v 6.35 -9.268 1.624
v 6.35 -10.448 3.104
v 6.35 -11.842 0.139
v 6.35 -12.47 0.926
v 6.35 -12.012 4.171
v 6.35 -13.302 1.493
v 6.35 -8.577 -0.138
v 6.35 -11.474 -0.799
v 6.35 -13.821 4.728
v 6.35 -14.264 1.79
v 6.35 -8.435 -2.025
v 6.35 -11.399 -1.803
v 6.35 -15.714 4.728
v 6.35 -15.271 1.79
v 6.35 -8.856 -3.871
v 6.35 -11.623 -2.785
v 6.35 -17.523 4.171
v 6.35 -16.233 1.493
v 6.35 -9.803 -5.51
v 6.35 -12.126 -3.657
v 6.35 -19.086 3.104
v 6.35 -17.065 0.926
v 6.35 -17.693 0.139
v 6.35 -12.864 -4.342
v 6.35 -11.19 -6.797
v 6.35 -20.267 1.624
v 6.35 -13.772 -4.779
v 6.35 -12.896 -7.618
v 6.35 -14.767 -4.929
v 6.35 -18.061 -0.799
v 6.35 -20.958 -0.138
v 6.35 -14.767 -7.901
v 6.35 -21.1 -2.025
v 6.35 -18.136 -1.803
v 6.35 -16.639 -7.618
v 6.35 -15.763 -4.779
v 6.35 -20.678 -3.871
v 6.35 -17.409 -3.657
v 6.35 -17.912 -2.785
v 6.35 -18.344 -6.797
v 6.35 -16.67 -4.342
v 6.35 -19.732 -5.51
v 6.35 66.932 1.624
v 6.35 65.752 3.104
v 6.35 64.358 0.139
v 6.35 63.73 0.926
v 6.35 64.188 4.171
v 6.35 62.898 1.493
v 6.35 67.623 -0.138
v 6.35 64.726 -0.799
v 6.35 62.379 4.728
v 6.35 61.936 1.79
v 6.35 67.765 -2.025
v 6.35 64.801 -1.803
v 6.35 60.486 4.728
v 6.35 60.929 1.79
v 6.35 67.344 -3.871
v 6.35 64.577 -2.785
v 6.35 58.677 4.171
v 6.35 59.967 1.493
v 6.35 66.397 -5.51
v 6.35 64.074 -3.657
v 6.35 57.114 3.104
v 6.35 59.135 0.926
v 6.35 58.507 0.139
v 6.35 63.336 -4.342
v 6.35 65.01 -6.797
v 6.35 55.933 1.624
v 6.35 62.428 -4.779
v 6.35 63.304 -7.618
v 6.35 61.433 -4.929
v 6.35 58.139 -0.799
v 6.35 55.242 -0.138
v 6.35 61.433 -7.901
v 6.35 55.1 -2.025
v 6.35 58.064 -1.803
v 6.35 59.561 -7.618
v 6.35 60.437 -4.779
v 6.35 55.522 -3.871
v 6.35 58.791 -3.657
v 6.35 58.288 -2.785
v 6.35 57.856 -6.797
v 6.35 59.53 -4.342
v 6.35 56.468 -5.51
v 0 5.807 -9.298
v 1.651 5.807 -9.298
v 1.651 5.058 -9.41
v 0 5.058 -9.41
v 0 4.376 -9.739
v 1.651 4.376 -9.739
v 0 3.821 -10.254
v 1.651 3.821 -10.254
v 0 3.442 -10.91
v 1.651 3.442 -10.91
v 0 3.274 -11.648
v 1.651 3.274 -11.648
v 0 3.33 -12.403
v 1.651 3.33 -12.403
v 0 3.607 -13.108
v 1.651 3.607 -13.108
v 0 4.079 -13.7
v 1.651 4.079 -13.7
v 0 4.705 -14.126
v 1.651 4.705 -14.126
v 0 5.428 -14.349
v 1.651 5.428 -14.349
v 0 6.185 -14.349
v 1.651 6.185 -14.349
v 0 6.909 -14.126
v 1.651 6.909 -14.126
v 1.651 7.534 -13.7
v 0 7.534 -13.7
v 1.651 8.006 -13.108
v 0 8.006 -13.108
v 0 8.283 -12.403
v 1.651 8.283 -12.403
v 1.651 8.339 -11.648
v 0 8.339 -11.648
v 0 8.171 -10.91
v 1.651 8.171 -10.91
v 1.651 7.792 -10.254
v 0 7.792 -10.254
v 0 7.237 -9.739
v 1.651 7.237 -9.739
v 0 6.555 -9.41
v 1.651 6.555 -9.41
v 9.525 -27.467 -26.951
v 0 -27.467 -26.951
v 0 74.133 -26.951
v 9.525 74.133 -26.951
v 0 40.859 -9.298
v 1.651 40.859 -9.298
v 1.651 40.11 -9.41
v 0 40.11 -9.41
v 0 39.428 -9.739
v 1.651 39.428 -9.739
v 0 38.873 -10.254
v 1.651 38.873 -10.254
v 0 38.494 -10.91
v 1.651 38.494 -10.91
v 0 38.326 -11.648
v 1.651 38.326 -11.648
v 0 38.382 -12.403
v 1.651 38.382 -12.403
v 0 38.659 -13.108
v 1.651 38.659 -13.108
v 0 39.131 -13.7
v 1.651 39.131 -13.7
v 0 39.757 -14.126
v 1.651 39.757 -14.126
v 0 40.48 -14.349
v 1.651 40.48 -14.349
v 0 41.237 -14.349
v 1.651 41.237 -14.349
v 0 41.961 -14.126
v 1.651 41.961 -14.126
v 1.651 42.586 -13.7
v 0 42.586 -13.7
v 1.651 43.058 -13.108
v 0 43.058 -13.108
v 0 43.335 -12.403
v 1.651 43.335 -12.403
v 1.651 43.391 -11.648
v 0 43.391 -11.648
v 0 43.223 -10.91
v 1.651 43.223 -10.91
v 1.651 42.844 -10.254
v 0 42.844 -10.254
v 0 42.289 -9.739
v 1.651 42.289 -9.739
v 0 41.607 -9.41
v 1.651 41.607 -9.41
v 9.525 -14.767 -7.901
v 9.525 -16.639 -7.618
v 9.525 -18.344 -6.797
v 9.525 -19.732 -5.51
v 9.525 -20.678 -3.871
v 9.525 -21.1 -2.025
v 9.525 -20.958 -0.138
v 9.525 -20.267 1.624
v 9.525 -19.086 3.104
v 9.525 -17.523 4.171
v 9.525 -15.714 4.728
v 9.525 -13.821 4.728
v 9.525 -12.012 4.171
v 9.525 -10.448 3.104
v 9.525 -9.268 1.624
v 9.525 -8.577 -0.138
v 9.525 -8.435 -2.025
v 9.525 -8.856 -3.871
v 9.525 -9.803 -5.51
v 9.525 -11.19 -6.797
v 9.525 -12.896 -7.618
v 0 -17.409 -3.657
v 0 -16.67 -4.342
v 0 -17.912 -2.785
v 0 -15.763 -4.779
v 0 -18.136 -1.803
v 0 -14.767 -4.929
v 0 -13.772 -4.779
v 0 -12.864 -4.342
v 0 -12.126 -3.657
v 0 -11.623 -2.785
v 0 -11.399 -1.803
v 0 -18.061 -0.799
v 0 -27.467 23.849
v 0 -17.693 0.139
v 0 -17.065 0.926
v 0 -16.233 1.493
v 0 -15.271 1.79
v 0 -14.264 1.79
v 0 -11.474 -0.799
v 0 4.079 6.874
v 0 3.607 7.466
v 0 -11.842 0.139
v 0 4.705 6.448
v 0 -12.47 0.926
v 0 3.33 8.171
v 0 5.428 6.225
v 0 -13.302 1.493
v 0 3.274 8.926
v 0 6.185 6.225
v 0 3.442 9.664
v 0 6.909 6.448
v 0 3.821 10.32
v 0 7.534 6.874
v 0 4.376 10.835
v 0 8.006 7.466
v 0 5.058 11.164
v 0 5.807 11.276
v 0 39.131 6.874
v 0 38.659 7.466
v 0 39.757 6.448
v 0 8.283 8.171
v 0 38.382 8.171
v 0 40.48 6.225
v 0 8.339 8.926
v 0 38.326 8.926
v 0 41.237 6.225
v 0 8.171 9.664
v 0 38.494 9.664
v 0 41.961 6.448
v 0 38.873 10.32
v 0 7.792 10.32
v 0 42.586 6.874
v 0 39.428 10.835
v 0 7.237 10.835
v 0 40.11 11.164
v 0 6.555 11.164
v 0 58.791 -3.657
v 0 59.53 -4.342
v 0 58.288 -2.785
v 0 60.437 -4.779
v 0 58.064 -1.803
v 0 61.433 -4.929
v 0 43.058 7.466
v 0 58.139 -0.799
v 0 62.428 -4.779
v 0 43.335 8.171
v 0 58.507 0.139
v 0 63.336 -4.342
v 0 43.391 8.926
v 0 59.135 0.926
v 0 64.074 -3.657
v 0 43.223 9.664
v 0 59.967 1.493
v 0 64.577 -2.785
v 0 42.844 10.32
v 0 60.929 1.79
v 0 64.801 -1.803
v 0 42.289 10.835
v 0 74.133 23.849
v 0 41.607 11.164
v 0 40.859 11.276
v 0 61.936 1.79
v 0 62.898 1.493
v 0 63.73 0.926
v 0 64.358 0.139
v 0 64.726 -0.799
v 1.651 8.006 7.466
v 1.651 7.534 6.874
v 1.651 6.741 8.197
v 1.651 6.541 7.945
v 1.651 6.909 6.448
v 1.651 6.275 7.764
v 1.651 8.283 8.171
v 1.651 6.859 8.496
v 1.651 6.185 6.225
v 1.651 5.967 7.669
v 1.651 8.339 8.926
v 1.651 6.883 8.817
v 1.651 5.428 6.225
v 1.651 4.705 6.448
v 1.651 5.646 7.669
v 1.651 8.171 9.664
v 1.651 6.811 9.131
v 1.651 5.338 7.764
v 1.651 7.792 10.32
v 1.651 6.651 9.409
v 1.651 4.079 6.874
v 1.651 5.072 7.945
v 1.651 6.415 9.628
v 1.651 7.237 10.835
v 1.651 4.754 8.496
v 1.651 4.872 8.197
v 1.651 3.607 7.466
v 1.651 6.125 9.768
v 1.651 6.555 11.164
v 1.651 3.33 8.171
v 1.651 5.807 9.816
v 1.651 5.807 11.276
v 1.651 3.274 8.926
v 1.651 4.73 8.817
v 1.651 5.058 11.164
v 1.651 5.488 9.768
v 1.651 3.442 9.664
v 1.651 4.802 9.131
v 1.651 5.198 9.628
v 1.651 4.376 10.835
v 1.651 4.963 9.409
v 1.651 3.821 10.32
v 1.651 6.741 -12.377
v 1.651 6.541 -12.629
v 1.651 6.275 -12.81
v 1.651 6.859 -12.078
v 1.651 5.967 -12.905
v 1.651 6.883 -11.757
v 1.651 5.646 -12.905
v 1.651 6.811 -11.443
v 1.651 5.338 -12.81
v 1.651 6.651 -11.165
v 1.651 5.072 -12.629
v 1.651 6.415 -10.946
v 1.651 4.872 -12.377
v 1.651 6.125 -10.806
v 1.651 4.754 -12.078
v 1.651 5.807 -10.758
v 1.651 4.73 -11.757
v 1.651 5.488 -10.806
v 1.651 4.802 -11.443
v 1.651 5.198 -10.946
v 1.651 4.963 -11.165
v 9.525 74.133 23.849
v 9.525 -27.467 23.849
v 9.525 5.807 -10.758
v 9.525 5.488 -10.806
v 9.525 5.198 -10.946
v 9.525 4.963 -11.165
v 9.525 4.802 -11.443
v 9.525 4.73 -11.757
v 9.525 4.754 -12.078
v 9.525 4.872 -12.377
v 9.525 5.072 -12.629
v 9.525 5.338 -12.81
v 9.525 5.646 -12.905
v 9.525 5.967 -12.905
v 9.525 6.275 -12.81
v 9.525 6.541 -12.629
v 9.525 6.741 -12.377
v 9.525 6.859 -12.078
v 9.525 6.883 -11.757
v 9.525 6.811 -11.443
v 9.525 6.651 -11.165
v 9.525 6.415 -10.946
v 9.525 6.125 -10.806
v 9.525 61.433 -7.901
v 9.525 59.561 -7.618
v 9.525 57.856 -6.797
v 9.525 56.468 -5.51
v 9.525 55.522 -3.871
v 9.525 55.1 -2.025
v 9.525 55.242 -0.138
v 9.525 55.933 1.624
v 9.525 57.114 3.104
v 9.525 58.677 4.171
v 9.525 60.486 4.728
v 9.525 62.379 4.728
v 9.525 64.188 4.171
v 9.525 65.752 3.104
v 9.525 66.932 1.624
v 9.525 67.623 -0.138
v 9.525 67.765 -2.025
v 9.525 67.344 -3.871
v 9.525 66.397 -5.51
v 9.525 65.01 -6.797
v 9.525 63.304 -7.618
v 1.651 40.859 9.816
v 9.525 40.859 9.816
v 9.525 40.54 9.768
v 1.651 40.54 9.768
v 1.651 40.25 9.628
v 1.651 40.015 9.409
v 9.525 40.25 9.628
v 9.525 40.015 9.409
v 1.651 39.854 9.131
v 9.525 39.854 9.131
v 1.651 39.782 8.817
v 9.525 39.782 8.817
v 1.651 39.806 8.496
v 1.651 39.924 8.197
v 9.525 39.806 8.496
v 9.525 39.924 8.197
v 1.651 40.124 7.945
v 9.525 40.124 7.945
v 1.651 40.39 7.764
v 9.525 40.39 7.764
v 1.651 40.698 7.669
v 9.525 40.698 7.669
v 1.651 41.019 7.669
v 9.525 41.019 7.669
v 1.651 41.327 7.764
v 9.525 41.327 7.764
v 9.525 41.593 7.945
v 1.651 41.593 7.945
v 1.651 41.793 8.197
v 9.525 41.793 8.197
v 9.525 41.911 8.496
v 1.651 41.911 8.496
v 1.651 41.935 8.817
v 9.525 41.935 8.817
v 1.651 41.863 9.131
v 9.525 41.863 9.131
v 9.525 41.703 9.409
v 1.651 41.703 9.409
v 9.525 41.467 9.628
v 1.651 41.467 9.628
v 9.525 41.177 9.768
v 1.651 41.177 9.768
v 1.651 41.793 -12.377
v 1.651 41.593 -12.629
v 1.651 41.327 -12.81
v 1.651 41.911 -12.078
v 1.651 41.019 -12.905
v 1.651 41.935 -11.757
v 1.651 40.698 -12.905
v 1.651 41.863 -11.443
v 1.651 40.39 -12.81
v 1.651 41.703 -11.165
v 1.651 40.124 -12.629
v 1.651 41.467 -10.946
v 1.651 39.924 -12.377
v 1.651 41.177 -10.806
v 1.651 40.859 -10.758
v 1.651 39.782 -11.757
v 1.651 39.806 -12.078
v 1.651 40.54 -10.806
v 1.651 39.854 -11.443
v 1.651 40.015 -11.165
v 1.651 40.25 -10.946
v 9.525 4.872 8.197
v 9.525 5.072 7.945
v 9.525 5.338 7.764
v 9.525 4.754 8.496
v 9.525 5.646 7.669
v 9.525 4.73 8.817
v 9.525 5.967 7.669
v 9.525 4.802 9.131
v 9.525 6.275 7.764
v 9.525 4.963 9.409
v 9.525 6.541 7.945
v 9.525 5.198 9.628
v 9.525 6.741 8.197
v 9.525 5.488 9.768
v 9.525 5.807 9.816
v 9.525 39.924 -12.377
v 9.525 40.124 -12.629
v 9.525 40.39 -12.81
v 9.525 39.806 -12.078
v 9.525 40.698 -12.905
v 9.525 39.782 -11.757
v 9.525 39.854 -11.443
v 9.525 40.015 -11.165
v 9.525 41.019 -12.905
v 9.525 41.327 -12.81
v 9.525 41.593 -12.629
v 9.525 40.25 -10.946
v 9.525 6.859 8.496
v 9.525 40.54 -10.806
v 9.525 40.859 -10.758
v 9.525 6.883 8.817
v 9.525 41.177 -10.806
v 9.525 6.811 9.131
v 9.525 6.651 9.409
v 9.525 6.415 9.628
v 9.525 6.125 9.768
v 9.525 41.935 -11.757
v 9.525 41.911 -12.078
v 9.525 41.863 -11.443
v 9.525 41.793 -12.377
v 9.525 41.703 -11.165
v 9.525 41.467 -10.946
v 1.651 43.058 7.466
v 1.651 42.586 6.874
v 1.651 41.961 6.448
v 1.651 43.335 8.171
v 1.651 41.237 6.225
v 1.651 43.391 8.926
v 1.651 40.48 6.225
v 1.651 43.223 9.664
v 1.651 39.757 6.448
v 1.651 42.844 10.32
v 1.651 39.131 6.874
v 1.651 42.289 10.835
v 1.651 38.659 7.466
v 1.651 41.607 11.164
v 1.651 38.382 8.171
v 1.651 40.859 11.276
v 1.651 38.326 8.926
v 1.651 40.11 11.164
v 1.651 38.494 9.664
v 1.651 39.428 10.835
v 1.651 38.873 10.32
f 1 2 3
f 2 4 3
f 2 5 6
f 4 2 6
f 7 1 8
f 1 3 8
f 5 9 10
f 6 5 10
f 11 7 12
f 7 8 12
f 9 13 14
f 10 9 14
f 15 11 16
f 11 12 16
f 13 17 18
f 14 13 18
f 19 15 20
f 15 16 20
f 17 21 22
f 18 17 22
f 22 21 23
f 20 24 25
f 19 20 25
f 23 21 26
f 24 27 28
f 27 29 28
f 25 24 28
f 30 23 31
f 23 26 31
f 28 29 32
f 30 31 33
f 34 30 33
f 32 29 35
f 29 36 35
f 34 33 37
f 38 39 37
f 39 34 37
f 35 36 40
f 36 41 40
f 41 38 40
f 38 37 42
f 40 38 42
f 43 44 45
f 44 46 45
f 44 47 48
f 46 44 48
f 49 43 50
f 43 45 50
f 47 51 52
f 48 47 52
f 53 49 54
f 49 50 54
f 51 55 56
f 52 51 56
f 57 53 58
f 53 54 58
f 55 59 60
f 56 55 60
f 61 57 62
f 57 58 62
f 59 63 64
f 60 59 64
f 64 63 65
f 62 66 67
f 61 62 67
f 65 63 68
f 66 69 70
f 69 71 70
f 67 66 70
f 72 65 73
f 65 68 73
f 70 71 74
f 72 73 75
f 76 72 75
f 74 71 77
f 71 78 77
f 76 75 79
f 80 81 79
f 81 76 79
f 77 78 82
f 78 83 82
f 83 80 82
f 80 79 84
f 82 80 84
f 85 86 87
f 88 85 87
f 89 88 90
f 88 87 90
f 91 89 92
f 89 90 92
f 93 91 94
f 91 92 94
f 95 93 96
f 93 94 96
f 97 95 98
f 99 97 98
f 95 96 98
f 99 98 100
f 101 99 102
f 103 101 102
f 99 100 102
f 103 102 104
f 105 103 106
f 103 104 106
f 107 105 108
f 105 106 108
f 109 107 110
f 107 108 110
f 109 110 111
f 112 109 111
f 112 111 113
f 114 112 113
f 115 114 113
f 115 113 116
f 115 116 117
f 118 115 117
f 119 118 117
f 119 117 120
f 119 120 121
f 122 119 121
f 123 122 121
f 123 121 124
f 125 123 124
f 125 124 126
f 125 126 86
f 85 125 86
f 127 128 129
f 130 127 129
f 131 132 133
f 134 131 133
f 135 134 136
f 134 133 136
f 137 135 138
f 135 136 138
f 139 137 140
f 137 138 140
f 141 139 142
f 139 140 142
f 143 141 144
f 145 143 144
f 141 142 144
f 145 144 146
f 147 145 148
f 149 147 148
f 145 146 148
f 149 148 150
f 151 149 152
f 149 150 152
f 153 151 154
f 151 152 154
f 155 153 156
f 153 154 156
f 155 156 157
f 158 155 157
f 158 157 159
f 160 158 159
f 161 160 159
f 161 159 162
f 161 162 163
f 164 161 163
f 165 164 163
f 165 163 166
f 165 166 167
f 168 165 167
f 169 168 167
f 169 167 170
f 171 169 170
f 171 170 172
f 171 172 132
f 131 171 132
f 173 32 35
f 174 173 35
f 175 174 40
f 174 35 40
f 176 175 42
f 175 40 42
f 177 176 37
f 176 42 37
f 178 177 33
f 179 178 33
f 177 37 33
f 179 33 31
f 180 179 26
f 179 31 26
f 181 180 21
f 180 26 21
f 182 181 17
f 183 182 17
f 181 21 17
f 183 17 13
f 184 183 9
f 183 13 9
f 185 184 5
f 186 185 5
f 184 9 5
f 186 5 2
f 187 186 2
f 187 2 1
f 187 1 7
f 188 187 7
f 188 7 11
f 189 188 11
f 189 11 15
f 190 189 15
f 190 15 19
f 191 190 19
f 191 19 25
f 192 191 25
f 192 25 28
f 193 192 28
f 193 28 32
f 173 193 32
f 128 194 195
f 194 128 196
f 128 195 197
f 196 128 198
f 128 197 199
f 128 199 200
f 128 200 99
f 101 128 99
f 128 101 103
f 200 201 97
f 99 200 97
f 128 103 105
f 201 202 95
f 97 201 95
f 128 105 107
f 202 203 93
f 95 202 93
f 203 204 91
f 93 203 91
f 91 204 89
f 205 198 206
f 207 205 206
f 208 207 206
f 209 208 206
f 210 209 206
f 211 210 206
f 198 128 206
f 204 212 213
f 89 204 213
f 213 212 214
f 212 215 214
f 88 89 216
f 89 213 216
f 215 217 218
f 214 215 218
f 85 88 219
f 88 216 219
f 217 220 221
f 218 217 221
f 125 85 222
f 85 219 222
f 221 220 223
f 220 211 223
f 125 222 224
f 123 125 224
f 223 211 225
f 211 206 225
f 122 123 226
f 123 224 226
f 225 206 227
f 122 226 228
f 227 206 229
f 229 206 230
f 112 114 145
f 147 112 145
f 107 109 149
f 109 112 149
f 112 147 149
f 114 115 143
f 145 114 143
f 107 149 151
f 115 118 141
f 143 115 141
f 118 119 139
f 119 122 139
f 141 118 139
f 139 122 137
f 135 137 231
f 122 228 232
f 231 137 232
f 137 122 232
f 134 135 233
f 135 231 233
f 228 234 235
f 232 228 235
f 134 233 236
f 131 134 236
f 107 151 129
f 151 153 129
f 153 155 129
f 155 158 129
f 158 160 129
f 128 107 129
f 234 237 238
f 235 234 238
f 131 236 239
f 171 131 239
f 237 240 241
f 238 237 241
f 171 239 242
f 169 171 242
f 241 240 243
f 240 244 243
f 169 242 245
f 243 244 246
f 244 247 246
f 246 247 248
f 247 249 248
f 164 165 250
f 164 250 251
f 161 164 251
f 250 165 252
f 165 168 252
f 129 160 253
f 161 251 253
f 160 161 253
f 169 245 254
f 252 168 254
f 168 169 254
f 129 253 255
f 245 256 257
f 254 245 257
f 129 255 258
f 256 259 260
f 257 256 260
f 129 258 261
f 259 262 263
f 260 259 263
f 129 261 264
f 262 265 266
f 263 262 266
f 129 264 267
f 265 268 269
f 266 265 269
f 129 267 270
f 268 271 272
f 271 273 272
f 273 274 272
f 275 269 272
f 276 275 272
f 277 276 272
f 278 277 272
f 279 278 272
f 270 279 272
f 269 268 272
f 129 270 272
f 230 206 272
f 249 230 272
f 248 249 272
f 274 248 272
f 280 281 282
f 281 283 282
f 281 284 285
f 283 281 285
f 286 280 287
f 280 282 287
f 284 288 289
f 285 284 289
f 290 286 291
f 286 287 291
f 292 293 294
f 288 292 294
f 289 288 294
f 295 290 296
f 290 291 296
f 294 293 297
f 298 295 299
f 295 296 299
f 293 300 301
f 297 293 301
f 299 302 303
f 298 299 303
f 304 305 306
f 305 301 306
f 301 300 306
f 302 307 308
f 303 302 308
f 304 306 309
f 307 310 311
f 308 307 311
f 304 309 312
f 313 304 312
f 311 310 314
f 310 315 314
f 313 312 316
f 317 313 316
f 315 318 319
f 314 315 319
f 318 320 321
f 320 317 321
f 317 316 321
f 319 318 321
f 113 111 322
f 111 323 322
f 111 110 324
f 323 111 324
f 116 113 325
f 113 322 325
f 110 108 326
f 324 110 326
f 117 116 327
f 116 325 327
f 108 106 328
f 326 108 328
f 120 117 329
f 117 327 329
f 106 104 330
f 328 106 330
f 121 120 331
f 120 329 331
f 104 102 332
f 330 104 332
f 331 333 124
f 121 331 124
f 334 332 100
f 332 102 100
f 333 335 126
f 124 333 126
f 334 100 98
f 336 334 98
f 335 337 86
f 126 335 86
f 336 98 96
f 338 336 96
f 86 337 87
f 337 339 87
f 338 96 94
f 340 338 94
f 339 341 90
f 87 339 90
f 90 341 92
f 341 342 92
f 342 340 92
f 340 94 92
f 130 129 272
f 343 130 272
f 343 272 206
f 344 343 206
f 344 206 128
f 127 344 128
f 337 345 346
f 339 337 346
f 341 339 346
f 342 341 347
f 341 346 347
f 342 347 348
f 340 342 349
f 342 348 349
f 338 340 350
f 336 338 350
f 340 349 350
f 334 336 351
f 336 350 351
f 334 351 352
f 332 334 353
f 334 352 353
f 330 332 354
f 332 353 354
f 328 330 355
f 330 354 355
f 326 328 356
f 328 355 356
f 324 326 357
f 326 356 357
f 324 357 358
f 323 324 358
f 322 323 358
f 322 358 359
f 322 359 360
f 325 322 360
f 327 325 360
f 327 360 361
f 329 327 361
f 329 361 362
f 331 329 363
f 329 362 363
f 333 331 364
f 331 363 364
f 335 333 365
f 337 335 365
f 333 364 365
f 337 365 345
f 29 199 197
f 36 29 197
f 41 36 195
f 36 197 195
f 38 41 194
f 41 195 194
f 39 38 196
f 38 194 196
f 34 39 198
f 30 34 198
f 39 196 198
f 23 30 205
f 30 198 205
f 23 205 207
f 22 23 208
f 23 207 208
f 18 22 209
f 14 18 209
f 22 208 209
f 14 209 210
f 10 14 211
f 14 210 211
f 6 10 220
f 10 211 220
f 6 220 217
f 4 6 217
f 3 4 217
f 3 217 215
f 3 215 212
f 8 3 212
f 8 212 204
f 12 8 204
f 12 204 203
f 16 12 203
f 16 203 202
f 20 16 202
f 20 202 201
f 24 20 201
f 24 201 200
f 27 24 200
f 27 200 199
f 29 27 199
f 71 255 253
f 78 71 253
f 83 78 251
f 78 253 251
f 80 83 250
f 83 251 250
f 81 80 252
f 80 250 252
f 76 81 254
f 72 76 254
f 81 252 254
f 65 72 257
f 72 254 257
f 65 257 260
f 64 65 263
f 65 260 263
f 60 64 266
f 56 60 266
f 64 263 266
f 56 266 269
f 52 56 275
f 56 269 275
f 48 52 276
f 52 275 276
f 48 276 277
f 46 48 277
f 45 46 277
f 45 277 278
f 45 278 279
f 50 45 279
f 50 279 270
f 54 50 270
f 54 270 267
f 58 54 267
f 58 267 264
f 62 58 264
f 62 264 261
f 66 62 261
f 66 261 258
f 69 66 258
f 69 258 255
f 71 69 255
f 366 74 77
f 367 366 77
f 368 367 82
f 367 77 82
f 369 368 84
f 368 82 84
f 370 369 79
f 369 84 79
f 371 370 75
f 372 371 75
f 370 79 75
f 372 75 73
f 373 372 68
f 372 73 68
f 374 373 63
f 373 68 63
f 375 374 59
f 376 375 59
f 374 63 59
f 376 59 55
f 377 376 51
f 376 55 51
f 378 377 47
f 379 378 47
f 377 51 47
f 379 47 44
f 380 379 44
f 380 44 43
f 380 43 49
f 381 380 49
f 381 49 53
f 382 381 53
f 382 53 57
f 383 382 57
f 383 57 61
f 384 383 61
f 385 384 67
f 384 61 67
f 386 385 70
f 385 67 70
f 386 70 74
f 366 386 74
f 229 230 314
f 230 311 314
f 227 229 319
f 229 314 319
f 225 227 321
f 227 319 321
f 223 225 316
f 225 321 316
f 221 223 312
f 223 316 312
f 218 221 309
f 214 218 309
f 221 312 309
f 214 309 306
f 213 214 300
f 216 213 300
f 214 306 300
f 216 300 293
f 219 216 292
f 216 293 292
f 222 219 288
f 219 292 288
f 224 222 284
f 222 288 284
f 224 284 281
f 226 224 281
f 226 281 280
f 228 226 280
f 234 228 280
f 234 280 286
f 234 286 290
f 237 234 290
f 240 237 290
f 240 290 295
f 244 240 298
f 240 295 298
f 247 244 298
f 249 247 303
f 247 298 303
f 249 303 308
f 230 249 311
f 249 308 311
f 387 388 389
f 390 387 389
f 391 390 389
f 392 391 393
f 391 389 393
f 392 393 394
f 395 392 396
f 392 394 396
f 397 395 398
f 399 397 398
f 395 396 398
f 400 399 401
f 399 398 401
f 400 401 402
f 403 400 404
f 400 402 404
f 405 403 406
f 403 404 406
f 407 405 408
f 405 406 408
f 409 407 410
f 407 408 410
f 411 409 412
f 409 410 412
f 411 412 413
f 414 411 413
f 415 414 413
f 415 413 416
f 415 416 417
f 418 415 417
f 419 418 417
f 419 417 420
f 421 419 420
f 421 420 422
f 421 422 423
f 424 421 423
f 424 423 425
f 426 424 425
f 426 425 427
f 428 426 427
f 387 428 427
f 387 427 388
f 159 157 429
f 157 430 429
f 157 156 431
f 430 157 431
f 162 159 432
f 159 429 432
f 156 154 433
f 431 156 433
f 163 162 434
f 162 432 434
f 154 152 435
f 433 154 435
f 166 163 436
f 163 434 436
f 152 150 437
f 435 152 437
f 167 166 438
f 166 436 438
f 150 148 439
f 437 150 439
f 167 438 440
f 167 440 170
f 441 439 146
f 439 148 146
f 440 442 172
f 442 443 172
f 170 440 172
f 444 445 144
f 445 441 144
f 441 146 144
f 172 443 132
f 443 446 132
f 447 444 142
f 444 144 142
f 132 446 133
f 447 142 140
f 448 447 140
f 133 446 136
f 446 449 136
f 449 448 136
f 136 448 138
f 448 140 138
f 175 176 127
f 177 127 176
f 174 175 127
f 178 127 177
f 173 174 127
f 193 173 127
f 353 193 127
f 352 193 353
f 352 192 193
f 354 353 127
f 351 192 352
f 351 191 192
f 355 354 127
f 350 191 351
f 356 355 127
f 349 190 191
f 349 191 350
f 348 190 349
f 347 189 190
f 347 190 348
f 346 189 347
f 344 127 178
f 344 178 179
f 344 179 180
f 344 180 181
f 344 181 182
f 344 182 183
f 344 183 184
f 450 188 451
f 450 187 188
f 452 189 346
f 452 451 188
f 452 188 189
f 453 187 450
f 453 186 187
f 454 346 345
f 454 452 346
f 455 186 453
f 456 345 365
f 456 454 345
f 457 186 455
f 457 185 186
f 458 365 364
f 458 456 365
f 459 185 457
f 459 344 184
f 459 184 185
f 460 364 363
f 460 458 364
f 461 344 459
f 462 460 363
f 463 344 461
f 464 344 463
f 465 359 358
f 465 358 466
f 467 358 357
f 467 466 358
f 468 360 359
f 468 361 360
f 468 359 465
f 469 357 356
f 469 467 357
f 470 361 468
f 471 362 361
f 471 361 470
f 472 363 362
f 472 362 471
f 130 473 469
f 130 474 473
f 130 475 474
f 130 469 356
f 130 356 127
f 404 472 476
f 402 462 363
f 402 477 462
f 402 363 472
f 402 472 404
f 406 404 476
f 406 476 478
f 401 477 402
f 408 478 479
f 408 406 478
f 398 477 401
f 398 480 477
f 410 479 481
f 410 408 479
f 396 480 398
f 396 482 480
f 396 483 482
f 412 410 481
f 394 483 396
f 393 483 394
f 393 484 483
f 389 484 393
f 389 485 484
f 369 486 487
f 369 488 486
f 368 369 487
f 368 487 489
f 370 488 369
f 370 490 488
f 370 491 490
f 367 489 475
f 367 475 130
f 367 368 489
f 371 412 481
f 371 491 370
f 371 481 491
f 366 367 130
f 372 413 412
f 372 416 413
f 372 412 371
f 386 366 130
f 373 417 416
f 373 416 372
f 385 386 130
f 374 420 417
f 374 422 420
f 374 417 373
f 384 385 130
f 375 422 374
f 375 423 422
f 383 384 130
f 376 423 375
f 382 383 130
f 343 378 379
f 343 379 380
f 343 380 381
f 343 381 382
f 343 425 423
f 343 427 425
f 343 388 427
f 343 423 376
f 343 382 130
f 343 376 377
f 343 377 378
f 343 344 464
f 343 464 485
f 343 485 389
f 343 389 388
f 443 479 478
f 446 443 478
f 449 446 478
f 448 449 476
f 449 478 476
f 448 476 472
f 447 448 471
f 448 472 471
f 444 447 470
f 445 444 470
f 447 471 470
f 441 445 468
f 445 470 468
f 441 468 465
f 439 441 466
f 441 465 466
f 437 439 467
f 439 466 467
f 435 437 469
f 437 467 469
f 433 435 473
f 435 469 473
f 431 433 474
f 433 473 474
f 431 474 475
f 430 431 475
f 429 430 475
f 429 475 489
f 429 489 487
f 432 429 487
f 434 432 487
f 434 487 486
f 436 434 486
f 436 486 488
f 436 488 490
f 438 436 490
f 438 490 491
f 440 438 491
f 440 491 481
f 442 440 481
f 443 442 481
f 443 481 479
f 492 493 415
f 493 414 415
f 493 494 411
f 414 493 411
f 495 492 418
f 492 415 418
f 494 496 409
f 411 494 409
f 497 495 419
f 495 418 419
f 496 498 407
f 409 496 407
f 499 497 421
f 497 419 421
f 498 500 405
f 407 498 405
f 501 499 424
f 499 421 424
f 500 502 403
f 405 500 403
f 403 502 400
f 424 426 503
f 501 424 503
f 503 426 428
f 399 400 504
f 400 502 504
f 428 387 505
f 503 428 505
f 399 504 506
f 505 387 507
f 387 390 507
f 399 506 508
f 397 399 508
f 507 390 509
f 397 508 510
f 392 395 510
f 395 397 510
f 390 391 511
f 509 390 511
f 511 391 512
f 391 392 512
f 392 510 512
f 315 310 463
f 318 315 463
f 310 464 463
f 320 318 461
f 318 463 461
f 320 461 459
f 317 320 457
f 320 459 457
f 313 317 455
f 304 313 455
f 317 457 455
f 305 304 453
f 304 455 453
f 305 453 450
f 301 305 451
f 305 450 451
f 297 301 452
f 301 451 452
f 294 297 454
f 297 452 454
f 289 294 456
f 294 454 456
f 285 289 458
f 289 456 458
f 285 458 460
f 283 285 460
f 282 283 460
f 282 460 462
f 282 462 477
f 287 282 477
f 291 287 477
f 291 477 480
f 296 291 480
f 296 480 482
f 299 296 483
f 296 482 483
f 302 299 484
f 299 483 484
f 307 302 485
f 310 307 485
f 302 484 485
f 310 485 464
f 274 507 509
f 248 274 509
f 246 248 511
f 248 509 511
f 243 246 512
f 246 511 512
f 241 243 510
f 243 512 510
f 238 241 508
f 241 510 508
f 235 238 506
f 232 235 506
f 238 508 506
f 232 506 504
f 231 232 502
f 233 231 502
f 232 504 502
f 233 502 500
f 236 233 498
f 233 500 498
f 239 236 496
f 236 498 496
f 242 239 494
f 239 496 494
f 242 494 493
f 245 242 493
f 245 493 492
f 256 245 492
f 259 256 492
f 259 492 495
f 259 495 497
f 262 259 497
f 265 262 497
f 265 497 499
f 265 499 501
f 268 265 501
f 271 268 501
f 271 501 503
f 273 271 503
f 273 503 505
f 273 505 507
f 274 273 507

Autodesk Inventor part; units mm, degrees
ref_plane "YZ Plane" through (0, 0, 0) normal (1, 0, 0) x (0, 1, 0)
ref_plane "XZ Plane" through (0, 0, 0) normal (0, 1, 0) x (-1, 0, 0)
ref_plane "XY Plane" through (0, 0, 0) normal (0, 0, 1) x (1, 0, 0)
sketch "Sketch1" plane through (0, 0, 0) normal (1, 0, 0) x (0, 1, 0)
  line L0 (74.1326, 23.8494) -> (-27.4674, 23.8494)
  line L1 (-27.4674, 23.8494) -> (-27.4674, -26.9506)
  line L2 (-27.4674, -26.9506) -> (74.1326, -26.9506)
  line L3 (74.1326, -26.9506) -> (74.1326, 23.8494)
  point P0 (0, 0)
  dimension "d0" = 50.8
  dimension "d1" = 101.6
extrude "Extrusion1" add sketch "Sketch1" along normal blind 9.525
sketch "Sketch2" plane through (9.525, 0, 0) normal (1, 0, 0) x (0, 0, -1)
  line L0 (-23.8494, 74.1326) -> (-23.8494, -27.4674) projected
  line L1 (26.9506, 74.1326) -> (-23.8494, 74.1326) projected
  point P0 (0, 0)
  point P1 (1.5506, 61.4326)
  dimension "d11" = 25.4
  dimension "d12" = 12.7
hole "Hole1" at (9.525, 61.4326, -1.5506) direction (-1, 0, 0) diameter 6.7564 end through all counterbore diameter 12.7 counterbore depth 3.175
sketch "Sketch3" plane through (9.525, 0, 0) normal (1, 0, 0) x (0, 0, -1)
  line L0 (-23.8494, 74.1326) -> (-23.8494, -27.4674) projected
  line L1 (-23.8494, -27.4674) -> (26.9506, -27.4674) projected
  point P0 (0, 0)
  point P1 (1.5506, -14.7674)
  dimension "d21" = 25.4
  dimension "d22" = 12.7
hole "Hole2" at (9.525, -14.7674, -1.5506) direction (-1, 0, 0) diameter 6.7564 end through all counterbore diameter 12.7 counterbore depth 3.175
sketch "Sketch4" plane through (0, 0, 0) normal (-1, 0, 0) x (0, 0, 1)
  line L0 (-26.9506, 74.1326) -> (23.8494, 74.1326) projected
  line L1 (23.8494, 74.1326) -> (23.8494, -27.4674) projected
  point P0 (0, 0)
  point P1 (8.7364, 40.8586)
  dimension "d30" = 33.274
  dimension "d31" = 15.113
hole "Hole3" at (0, 40.8586, 8.7364) direction (1, 0, 0) diameter 2.159 end through all counterbore diameter 5.08 counterbore depth 1.651
sketch "Sketch5" plane through (0, 0, 0) normal (-1, 0, 0) x (0, 0, 1)
  line L0 (23.8494, -27.4674) -> (-26.9506, -27.4674) projected
  line L1 (-26.9506, 74.1326) -> (23.8494, 74.1326) projected
  line L2 (23.8494, 74.1326) -> (23.8494, -27.4674) projected
  point P0 (0, 0)
  point P1 (8.7364, 5.8066)
  dimension "d41" = 33.274
  dimension "d42" = 15.113
hole "Hole4" at (0, 5.8066, 8.7364) direction (1, 0, 0) diameter 2.159 end through all counterbore diameter 5.08 counterbore depth 1.651
sketch "Sketch6" plane through (0, 0, 0) normal (-1, 0, 0) x (0, 0, 1)
  line L0 (-26.9506, -27.4674) -> (-26.9506, 74.1326) projected
  line L1 (-26.9506, 74.1326) -> (23.8494, 74.1326) projected
  point P0 (0, 0)
  point P1 (-11.8376, 40.8586)
  dimension "d50" = 15.113
  dimension "d51" = 33.274
hole "Hole5" at (0, 40.8586, -11.8376) direction (1, 0, 0) diameter 2.159 end through all counterbore diameter 5.08 counterbore depth 1.651
sketch "Sketch7" plane through (0, 0, 0) normal (-1, 0, 0) x (0, 0, 1)
  line L0 (-26.9506, -27.4674) -> (-26.9506, 74.1326) projected
  line L1 (23.8494, -27.4674) -> (-26.9506, -27.4674) projected
  point P0 (0, 0)
  point P1 (-11.8376, 5.8066)
  dimension "d59" = 15.113
  dimension "d60" = 33.274
hole "Hole6" at (0, 5.8066, -11.8376) direction (1, 0, 0) diameter 2.159 end through all counterbore diameter 5.08 counterbore depth 1.651
properties part number "FV mounting plate V1"
